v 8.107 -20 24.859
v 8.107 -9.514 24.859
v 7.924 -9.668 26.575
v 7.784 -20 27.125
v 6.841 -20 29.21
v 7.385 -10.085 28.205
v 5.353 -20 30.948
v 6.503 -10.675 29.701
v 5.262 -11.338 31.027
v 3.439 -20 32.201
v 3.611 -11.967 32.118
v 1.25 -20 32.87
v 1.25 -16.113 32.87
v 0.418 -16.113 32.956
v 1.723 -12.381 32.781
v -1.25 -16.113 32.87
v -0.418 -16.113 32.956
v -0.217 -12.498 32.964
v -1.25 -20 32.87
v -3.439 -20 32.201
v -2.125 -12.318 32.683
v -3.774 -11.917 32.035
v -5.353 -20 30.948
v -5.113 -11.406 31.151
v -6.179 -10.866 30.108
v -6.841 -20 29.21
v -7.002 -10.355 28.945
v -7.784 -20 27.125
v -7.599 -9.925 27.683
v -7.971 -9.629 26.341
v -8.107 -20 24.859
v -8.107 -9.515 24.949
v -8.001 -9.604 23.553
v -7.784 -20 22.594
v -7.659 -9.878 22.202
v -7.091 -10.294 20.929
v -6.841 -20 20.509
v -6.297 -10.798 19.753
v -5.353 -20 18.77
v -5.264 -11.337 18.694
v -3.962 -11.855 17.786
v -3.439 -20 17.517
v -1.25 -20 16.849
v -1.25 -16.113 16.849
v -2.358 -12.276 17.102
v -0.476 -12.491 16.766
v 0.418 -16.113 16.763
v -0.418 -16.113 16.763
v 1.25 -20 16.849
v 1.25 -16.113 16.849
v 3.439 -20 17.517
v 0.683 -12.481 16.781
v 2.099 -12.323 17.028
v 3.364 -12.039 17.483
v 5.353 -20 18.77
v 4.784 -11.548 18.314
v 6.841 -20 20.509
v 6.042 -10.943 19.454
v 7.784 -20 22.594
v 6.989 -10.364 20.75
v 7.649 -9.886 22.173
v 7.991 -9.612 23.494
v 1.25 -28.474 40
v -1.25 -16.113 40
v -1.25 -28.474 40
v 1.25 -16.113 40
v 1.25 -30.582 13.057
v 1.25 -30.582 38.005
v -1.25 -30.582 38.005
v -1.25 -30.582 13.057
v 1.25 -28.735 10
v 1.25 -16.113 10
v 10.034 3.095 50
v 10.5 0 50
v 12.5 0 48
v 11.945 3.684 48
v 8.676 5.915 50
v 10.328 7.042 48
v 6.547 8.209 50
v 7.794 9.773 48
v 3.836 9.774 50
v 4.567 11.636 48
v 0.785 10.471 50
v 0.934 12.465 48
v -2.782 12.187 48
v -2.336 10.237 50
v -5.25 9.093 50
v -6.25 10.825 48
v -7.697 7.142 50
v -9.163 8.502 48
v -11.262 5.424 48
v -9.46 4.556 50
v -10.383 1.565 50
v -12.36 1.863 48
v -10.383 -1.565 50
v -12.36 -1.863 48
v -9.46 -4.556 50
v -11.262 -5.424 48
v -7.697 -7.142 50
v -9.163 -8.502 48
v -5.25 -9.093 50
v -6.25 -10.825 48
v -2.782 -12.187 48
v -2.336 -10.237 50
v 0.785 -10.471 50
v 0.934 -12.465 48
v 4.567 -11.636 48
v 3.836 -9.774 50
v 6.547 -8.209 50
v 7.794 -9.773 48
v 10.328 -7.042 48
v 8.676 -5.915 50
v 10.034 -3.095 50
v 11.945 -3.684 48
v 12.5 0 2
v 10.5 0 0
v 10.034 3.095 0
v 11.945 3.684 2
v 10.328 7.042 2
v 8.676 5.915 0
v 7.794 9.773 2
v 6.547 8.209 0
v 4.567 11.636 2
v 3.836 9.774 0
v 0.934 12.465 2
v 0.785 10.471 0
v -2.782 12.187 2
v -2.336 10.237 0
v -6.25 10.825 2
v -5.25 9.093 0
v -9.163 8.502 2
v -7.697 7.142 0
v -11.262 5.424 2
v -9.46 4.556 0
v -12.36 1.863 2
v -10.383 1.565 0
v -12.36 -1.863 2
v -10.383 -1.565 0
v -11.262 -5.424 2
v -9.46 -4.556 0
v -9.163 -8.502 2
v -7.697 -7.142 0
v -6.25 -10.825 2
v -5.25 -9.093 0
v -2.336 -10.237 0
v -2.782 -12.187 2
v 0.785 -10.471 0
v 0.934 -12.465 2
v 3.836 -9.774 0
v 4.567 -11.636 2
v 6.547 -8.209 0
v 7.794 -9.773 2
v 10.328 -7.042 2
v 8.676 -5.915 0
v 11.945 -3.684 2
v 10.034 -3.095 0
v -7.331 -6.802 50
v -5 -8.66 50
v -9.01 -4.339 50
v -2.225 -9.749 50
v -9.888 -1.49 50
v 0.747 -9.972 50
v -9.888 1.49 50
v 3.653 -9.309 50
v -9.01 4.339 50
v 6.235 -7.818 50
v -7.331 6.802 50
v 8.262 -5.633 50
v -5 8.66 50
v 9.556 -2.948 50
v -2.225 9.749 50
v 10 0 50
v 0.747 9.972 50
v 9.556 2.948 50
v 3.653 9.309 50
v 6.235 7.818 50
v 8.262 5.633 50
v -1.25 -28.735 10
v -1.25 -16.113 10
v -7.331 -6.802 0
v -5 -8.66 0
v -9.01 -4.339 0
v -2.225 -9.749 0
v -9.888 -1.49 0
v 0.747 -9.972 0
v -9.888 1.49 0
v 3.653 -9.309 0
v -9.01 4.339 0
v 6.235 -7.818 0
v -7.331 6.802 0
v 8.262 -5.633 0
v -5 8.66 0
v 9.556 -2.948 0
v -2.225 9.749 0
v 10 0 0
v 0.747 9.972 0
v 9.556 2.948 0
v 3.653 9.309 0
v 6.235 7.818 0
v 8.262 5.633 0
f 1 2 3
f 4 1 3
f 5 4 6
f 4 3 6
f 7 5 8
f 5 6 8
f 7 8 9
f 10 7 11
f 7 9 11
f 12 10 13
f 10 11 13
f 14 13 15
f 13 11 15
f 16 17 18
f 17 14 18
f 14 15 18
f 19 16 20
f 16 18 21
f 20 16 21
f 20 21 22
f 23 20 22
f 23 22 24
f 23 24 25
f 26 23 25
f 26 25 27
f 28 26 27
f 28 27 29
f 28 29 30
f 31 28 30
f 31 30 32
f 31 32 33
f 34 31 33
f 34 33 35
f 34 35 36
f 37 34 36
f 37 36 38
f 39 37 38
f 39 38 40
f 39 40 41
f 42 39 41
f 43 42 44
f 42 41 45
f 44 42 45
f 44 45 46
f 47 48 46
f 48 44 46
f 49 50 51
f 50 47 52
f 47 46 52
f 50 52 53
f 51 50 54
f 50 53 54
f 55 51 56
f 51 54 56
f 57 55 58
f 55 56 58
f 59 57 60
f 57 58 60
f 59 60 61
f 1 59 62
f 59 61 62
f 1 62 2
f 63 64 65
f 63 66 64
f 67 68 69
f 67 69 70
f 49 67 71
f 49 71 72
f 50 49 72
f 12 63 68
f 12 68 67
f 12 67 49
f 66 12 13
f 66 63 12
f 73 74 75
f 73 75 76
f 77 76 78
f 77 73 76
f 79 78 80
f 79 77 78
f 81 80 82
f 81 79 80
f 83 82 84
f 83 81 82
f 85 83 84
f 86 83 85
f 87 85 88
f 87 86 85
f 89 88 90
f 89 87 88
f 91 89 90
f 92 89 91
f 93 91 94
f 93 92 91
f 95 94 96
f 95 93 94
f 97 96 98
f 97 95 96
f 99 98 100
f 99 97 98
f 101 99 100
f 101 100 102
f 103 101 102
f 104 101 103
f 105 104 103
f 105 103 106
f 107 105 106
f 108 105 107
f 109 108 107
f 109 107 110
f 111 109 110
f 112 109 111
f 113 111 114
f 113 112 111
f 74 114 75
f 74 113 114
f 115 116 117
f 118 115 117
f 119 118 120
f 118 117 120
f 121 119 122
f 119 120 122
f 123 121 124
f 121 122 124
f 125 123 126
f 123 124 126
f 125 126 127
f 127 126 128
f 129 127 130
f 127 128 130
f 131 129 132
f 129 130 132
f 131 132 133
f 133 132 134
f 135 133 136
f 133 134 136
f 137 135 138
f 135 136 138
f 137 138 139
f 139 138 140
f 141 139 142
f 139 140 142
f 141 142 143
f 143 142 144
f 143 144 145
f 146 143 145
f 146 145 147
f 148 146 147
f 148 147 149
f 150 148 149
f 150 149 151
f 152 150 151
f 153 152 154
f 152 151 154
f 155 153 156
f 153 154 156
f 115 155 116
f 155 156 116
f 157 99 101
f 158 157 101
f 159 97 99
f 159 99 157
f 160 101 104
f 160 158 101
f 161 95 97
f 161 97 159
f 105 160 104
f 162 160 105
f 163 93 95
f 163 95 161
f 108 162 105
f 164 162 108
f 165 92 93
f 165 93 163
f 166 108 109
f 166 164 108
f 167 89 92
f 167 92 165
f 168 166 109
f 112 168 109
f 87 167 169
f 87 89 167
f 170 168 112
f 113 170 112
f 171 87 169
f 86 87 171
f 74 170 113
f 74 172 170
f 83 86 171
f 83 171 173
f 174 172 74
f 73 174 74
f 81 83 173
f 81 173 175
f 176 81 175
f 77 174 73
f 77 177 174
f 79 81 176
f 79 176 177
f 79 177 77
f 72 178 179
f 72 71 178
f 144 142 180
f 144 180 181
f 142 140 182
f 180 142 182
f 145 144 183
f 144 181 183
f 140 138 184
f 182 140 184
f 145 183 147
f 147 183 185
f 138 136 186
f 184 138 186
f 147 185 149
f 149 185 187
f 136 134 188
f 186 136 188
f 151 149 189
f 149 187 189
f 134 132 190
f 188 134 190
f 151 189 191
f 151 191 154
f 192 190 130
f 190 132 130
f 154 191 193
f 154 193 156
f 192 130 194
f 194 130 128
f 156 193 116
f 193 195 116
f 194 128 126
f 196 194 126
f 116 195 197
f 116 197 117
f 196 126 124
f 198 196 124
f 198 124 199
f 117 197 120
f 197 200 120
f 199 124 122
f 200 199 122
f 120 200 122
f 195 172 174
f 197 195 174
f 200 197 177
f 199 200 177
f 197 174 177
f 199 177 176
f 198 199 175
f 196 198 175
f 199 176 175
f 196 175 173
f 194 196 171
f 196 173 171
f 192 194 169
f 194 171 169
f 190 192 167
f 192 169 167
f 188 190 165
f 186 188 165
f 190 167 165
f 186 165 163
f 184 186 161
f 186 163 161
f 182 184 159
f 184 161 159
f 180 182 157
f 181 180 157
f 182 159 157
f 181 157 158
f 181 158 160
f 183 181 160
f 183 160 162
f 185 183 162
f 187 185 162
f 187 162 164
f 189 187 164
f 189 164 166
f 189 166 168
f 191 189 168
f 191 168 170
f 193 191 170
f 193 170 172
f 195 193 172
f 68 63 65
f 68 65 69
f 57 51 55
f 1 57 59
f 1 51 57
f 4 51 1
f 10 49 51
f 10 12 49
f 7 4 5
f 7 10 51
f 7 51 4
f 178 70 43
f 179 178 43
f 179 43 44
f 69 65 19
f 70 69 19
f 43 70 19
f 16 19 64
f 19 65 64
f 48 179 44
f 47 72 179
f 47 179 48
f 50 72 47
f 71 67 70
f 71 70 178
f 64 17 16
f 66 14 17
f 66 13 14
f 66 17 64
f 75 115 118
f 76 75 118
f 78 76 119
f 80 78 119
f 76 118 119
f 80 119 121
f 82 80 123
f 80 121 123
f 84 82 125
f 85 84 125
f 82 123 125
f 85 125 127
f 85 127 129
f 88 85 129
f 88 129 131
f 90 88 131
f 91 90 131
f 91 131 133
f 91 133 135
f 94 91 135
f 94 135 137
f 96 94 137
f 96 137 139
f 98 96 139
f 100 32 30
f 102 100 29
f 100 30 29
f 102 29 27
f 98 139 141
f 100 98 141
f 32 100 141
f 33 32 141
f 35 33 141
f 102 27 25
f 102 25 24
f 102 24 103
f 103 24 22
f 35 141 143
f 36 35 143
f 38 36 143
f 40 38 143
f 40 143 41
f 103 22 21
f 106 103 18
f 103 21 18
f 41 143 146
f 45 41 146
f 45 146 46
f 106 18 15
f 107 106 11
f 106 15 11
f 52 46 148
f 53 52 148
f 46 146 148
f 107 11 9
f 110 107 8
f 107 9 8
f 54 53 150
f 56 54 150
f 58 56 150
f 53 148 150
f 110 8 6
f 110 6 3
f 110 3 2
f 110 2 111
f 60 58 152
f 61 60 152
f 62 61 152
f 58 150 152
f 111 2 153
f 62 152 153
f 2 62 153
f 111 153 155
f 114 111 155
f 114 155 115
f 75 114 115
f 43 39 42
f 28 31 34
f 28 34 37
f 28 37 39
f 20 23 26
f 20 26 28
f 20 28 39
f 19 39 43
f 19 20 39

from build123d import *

# Parameters (mm, degrees)
F0_R     = 12.5
F1_DEPTH = 50
F2_SIZE  = 2
F3_R     = 8.1072881944
F4_DEPTH = 20
F5_R     = 10
F6_DEPTH = 50.001
F8_DEPTH = 1.25


with BuildPart() as f1:
    # F0 (on Top) → F1 (new body)
    with BuildSketch(Plane.XY):
        Circle(F0_R)
    extrude(amount=F1_DEPTH)

    # F2
    f2_edges = [f1.edges().sort_by_distance(p)[0] for p in [
        (-12.5, 0, 50),
        (-12.5, 0, 0),
    ]]
    chamfer(f2_edges, length=F2_SIZE)

    # F3 (on Front) → F4 (join)
    with BuildSketch(Plane.XZ):
        with Locations((0, 24.8591881245)):
            Circle(F3_R)
    extrude(amount=F4_DEPTH)

    # F5 (on face) → F6 (cut, through all)
    with BuildSketch(Plane.XY.offset(50)):
        Circle(F5_R)
    extrude(amount=-F6_DEPTH, mode=Mode.SUBTRACT)

    # F7 (on Right) → F8 (join, symmetric)
    with BuildSketch(Plane.YZ):
        Polygon((-16.112501399, 40), (-28.4739788622, 40), (-30.5820492643, 38.0051359534), (-30.5820492643, 13.057355769), (-28.7352129817, 10), (-16.112501399, 10), align=None)
    extrude(amount=F8_DEPTH, both=True)


solid = f1.part
